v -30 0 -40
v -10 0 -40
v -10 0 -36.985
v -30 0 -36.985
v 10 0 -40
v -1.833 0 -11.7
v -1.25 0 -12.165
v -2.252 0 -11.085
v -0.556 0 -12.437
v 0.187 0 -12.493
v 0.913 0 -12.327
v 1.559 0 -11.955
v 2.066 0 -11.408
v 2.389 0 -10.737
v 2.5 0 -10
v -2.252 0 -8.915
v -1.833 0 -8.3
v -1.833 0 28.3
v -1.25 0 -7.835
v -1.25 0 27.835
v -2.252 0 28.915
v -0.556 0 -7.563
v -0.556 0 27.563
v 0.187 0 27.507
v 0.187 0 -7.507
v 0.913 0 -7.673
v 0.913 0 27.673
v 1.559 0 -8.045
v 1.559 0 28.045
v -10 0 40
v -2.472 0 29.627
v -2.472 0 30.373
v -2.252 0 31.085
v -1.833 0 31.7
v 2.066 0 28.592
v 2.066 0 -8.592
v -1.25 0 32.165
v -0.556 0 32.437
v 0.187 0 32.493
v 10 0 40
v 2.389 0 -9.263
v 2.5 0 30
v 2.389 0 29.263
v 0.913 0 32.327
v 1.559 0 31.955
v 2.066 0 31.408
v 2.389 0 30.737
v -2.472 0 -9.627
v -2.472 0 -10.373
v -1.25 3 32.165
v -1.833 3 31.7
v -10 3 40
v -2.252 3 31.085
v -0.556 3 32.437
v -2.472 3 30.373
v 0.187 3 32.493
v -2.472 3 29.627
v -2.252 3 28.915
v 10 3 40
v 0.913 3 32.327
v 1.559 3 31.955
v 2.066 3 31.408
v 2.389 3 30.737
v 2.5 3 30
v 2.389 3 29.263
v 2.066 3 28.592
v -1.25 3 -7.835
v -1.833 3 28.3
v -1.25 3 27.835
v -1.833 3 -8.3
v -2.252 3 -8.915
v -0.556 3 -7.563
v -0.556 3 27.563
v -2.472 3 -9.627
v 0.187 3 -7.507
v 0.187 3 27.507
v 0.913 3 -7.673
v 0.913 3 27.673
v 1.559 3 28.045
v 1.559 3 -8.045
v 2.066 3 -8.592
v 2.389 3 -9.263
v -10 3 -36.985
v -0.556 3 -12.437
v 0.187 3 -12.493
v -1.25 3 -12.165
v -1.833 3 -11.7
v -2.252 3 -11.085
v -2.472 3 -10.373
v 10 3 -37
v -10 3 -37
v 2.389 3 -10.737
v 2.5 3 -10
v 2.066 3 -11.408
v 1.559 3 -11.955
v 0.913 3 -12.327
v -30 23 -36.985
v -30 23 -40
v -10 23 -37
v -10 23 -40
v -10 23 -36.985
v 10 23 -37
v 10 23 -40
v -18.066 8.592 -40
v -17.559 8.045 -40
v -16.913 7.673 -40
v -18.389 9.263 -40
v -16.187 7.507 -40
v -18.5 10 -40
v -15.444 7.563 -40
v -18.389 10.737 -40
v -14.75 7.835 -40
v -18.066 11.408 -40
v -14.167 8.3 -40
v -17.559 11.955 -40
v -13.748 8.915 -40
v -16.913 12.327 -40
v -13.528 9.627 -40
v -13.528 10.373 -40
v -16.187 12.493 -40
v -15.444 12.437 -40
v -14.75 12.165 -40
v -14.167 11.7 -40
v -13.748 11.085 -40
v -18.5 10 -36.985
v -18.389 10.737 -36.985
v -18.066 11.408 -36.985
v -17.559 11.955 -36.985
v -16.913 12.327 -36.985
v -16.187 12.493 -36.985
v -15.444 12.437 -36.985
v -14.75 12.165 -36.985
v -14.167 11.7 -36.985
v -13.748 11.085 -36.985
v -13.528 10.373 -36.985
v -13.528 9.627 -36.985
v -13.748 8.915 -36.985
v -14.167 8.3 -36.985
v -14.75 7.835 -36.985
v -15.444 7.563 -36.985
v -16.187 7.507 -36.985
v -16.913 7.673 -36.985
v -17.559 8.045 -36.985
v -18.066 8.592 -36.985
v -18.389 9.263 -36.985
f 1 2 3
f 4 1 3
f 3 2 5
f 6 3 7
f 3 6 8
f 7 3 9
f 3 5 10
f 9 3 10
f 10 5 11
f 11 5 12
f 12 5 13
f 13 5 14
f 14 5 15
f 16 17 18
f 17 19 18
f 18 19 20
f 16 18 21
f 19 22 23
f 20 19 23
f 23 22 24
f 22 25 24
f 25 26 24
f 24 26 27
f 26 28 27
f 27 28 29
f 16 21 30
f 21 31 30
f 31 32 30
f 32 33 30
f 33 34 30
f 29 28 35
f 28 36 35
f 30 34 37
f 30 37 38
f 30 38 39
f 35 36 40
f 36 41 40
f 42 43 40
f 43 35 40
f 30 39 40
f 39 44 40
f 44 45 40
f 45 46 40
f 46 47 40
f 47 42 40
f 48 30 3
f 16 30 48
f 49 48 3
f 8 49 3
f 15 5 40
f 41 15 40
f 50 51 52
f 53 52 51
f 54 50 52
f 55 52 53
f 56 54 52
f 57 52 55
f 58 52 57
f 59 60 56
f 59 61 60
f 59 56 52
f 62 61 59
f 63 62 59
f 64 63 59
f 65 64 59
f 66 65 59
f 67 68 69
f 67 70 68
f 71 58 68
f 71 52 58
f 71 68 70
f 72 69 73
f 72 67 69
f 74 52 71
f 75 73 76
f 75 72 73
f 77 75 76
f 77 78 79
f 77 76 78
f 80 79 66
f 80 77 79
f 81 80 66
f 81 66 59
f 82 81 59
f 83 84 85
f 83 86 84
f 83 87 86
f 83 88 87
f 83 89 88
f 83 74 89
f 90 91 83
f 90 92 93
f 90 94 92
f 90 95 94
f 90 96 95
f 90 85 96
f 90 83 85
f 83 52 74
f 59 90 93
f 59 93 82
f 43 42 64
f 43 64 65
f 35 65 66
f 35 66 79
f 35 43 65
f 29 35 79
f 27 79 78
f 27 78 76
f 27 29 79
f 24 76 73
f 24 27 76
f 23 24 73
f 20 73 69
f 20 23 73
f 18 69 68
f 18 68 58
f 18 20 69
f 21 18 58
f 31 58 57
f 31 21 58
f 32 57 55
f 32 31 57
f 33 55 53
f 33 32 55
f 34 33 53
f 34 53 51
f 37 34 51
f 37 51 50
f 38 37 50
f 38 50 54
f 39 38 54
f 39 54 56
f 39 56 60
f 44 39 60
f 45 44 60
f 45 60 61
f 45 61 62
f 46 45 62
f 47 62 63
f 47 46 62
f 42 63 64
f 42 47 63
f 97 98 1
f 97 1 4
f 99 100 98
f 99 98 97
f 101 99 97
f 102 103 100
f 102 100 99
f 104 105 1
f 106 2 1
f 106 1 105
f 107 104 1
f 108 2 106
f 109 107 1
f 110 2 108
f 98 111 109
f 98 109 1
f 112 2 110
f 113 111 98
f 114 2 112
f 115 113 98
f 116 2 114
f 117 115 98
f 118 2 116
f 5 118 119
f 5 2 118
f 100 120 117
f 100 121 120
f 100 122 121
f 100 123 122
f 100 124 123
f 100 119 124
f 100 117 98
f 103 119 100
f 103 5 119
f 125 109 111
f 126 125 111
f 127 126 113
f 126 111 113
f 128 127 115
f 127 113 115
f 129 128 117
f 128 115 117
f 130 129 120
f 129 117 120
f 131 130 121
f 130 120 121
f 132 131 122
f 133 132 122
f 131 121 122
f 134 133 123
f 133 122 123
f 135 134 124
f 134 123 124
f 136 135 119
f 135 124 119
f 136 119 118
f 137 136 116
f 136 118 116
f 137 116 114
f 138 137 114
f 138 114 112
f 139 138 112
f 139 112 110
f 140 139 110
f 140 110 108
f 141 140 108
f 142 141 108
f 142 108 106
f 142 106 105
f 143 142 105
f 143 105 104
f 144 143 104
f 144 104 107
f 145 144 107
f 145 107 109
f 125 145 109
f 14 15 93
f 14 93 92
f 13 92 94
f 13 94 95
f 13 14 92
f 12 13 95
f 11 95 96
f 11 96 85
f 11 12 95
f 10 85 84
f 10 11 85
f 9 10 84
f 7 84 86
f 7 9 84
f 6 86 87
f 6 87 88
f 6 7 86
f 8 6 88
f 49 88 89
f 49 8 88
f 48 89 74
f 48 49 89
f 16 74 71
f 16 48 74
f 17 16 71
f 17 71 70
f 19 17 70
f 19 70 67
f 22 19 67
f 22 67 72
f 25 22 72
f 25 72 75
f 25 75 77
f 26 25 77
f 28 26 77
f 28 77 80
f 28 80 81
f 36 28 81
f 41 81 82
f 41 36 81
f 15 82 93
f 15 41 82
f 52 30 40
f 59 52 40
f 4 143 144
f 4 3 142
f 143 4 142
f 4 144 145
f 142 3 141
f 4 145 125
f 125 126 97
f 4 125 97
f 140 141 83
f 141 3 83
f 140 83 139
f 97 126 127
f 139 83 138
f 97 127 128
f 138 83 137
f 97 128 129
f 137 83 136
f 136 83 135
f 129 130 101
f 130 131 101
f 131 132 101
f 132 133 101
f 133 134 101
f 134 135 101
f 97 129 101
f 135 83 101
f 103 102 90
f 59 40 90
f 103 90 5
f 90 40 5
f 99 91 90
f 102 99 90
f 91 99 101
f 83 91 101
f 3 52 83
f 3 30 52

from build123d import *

# Parameters (mm, degrees)
SKETCH1_W           = 20
SKETCH1_H           = 80
SKETCH1_R           = 2.5
BOSS_EXTRUDE1_DEPTH = 3
SKETCH2_W           = 20
SKETCH2_H           = 3
BOSS_EXTRUDE2_DEPTH = 20
SKETCH4_W           = 3.015323491
SKETCH4_H           = 23
BOSS_EXTRUDE4_DEPTH = 20
SKETCH7_R           = 2.5
CUT_EXTRUDE2_DEPTH  = 20


with BuildPart() as part:
    # Sketch1 → Boss-Extrude1 (new body)
    with BuildSketch(Plane(origin=(0, 0, 0), x_dir=(1, 0, 0), z_dir=(0, 1, 0))):
        Rectangle(SKETCH1_W, SKETCH1_H)
        with Locations((0, -30)):
            Circle(SKETCH1_R, mode=Mode.SUBTRACT)
        with Locations((0, 10)):
            Circle(SKETCH1_R, mode=Mode.SUBTRACT)
    extrude(amount=BOSS_EXTRUDE1_DEPTH)

    # Sketch2 → Boss-Extrude2 (add)
    with BuildSketch(Plane(origin=(0, 3, 0), x_dir=(1, 0, 0), z_dir=(0, 1, 0))):
        with Locations((0, 38.5)):
            Rectangle(SKETCH2_W, SKETCH2_H)
    extrude(amount=BOSS_EXTRUDE2_DEPTH)

    # Sketch4 → Boss-Extrude4 (add)
    with BuildSketch(Plane.ZY.offset(10)):
        with Locations((-38.492338254, 11.5)):
            Rectangle(SKETCH4_W, SKETCH4_H)
    extrude(amount=BOSS_EXTRUDE4_DEPTH)

    # Sketch7 → Cut-Extrude2 (cut)
    with BuildSketch(Plane(origin=(0, 0, -40), x_dir=(-1, 0, 0), z_dir=(0, 0, -1))):
        with Locations((16, 10)):
            Circle(SKETCH7_R)
    extrude(amount=-CUT_EXTRUDE2_DEPTH, mode=Mode.SUBTRACT)


solid = part.part
